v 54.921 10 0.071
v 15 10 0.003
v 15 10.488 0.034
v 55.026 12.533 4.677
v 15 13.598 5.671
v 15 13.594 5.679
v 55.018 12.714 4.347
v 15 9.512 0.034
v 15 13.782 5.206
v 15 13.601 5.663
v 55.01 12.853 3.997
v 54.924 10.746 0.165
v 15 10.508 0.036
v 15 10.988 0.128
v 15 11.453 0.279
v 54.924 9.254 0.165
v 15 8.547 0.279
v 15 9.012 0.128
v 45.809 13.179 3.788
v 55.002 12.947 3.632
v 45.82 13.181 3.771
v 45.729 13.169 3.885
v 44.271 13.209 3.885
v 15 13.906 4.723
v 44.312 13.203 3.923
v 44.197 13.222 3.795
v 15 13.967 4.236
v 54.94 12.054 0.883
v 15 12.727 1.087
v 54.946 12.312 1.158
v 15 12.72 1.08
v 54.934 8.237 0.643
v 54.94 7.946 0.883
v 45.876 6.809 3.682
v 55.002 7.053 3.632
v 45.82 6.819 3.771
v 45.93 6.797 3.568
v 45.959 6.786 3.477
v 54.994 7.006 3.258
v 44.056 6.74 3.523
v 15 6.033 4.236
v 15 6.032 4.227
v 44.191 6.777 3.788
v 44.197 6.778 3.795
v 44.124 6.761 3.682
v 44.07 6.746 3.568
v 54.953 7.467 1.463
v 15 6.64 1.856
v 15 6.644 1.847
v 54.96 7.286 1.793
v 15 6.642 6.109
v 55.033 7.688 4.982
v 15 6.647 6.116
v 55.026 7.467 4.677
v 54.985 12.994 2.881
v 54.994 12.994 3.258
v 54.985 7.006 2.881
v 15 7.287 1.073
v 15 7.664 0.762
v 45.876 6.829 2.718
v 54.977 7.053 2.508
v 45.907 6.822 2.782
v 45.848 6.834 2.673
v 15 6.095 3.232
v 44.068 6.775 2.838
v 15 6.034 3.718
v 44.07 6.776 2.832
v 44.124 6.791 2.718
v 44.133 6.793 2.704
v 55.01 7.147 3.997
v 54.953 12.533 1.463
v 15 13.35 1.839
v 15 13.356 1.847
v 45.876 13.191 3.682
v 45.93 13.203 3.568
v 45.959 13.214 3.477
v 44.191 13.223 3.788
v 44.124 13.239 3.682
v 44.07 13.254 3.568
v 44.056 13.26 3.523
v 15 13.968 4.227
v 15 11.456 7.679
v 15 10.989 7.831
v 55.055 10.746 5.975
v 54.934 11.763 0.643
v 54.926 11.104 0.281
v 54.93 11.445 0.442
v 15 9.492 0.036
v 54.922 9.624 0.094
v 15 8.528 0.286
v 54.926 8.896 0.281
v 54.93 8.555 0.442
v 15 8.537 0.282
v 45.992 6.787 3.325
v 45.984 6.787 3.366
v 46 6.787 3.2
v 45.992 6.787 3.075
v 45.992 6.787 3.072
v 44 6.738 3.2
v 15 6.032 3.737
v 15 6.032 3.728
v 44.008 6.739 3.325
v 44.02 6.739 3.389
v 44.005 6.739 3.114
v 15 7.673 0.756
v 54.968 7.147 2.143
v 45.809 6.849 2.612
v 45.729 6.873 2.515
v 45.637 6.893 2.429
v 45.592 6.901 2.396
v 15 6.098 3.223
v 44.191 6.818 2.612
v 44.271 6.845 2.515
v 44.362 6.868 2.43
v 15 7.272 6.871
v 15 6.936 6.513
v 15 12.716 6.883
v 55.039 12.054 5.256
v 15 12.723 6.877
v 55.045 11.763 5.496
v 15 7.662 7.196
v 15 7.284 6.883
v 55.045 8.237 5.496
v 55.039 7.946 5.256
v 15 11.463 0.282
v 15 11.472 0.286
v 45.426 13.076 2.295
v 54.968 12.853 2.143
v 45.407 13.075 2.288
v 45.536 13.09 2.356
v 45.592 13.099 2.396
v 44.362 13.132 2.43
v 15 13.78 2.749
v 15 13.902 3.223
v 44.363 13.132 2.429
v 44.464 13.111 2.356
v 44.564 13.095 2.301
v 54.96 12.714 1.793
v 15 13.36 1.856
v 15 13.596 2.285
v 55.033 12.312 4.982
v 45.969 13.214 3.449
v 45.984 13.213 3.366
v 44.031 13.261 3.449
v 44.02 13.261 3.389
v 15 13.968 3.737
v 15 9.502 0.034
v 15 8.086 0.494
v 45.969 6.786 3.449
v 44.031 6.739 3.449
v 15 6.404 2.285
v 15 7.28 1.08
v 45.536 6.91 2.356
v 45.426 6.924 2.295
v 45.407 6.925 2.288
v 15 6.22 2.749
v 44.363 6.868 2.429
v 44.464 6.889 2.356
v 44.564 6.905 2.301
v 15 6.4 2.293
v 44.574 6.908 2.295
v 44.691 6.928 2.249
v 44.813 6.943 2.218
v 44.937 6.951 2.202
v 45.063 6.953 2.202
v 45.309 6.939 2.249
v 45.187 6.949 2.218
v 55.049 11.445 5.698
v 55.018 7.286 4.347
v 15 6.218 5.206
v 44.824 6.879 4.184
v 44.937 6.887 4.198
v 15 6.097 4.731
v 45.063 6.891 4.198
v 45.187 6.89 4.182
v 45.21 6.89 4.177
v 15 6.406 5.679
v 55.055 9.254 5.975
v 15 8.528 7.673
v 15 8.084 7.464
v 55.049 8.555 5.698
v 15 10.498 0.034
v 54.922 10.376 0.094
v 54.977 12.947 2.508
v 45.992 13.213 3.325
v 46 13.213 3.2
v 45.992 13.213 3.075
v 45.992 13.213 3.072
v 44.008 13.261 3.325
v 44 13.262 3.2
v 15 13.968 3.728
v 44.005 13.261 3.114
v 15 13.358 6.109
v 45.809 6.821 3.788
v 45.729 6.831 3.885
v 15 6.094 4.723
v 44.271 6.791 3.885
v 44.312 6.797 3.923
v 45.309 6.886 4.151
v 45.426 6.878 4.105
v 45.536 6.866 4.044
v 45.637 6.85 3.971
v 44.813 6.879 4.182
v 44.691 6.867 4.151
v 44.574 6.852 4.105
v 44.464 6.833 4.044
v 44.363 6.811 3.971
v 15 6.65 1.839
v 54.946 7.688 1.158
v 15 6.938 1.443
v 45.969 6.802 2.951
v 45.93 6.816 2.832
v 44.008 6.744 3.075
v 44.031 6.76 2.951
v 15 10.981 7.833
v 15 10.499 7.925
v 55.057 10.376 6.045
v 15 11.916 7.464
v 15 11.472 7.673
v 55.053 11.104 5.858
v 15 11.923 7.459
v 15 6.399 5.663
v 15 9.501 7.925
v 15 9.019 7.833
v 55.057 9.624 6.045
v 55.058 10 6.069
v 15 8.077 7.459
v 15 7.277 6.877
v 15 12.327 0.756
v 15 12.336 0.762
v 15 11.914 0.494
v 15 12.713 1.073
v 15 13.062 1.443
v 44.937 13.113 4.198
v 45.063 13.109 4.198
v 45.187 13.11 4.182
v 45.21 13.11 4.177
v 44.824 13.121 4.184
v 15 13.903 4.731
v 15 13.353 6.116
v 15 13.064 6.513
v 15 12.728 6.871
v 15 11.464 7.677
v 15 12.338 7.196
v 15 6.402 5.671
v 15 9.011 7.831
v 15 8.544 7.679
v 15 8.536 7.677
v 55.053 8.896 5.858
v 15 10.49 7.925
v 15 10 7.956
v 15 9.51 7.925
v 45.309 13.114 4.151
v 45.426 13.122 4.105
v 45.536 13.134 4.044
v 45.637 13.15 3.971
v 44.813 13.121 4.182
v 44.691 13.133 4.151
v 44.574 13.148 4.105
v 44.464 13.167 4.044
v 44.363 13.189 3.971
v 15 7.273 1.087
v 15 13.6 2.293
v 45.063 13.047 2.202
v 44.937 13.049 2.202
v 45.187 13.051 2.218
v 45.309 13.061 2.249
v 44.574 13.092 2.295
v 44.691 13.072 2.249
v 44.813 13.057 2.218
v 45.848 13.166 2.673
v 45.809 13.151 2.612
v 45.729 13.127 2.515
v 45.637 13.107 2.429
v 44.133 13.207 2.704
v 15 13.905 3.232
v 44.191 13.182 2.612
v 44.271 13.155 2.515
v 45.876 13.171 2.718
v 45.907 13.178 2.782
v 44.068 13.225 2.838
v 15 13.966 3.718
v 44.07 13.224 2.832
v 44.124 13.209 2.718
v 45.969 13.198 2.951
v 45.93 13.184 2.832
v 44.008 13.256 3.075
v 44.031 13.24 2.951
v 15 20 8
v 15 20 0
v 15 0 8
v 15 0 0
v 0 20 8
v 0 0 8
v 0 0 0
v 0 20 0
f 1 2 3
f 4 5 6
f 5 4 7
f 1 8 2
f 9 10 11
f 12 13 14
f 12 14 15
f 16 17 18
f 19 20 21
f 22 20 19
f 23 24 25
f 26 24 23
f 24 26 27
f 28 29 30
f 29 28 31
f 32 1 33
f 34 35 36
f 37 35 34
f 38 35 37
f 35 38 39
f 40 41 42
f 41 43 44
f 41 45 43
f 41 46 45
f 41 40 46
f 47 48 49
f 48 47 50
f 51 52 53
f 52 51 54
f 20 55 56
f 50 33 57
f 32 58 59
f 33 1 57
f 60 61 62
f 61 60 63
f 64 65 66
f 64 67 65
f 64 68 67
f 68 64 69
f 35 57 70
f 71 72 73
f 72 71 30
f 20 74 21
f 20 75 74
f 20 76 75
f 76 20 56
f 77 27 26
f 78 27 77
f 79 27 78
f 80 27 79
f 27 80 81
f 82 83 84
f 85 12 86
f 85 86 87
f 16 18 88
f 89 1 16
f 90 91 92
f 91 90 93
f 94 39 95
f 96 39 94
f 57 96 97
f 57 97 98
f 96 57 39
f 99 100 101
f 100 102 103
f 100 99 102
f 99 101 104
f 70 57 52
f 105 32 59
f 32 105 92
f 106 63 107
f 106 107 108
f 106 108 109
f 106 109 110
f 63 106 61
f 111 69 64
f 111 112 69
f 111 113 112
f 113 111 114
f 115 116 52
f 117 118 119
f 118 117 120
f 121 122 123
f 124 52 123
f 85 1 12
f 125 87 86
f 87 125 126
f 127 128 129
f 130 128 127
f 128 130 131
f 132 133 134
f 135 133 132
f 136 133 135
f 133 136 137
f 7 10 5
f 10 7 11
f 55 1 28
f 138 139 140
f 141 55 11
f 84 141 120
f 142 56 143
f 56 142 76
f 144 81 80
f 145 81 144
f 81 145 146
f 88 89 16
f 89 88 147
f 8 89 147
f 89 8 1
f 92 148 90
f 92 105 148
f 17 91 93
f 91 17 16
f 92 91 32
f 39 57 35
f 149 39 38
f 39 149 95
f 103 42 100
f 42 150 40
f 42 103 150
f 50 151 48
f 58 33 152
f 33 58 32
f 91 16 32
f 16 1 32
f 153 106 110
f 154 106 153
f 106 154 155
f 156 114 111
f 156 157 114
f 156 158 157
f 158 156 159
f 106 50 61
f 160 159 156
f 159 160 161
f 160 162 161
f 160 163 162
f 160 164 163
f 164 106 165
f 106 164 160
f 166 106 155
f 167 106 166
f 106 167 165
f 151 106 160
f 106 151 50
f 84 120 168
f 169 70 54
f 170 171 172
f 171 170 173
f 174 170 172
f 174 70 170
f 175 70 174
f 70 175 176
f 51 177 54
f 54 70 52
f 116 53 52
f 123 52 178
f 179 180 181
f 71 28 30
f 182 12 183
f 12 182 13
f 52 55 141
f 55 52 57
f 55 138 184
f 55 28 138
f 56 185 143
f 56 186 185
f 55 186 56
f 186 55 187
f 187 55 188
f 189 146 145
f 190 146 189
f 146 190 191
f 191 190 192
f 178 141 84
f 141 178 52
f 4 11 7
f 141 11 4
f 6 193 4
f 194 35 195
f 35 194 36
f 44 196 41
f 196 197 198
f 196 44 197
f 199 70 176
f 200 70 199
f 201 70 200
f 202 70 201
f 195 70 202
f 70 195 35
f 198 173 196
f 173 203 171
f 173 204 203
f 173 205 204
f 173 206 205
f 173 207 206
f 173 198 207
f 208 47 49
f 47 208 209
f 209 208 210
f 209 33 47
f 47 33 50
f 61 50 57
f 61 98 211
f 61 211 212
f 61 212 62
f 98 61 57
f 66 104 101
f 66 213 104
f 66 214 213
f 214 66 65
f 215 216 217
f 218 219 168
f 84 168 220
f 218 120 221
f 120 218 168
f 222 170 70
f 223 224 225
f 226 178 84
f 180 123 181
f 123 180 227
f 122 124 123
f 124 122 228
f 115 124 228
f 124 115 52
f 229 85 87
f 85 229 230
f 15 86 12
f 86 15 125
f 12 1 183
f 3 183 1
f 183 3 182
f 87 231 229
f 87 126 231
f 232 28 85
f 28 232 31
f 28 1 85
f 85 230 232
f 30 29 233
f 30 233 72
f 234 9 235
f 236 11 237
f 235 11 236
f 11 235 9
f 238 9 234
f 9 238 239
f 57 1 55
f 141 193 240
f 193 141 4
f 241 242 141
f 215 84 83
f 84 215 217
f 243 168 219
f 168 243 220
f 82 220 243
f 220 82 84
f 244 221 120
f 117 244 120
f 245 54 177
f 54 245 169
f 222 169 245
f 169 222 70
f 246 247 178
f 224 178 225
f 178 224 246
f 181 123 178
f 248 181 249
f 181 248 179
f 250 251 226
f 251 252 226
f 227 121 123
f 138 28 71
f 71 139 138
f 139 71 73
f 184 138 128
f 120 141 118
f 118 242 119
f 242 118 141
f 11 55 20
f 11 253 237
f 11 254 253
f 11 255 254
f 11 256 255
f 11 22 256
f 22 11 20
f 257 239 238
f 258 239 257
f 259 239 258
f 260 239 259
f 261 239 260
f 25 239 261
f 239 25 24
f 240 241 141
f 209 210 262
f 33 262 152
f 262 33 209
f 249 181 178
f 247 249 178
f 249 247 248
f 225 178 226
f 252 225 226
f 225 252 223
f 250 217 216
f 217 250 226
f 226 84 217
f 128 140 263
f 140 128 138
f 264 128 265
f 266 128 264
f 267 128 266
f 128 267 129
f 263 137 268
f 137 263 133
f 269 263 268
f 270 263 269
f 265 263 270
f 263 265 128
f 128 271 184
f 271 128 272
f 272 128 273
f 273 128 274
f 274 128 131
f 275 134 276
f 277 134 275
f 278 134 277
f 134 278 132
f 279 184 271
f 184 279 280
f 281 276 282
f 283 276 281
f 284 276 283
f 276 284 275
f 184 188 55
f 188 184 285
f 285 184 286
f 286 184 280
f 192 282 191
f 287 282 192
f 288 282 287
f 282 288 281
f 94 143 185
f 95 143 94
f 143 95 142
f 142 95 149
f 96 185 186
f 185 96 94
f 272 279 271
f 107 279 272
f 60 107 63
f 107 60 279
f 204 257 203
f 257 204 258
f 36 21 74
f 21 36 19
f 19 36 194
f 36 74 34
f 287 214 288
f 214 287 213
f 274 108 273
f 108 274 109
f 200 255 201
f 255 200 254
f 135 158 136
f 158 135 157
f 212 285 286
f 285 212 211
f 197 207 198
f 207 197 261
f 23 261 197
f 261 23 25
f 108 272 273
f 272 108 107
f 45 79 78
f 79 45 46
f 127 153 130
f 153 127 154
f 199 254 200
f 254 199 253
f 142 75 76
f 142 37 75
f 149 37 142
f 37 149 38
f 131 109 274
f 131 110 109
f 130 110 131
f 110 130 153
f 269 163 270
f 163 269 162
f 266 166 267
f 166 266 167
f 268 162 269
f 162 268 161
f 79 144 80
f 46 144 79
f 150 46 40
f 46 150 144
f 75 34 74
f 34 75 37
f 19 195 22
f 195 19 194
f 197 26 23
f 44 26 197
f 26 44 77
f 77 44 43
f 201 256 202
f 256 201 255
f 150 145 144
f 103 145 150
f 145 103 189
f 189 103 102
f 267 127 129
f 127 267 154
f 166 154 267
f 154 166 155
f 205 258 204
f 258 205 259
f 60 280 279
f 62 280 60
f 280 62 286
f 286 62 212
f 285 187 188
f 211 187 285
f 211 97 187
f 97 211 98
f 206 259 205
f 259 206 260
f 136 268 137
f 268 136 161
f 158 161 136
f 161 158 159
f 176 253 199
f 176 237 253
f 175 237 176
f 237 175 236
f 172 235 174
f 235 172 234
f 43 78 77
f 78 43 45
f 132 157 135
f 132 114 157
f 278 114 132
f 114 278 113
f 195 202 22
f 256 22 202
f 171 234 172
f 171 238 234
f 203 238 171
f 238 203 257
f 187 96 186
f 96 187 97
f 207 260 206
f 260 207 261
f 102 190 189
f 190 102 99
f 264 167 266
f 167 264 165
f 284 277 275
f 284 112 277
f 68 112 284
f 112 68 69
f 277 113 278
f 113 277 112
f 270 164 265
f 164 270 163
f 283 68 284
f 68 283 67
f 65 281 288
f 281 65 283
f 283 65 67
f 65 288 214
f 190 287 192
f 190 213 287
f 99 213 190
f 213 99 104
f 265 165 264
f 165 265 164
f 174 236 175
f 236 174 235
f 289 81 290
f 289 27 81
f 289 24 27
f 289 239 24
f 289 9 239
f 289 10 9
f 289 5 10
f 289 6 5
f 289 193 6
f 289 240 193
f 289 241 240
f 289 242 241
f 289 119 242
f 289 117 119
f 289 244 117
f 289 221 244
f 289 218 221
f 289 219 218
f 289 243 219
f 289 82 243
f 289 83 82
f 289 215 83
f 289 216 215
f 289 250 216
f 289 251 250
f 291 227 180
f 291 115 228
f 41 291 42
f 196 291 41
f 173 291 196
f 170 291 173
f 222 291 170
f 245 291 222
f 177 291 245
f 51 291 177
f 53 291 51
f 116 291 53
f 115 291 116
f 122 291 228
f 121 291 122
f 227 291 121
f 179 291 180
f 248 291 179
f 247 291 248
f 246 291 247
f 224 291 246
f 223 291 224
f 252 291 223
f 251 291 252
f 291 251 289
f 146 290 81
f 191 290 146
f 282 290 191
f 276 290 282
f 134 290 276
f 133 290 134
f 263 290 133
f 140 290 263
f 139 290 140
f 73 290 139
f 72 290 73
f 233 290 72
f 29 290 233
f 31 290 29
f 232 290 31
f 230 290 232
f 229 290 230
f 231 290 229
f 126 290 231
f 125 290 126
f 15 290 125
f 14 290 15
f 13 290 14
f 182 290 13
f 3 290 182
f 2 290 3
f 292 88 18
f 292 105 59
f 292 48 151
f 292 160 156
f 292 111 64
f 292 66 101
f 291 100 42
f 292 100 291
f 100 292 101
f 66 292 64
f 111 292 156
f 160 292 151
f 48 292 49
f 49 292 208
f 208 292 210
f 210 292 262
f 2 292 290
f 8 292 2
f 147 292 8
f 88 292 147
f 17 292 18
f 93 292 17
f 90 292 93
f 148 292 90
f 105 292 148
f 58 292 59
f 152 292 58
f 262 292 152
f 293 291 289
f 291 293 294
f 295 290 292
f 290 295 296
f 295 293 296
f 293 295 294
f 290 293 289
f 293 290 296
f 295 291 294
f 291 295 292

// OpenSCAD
$fn=50;

cube([15,20,8]);
difference () {
  translate([14,10,4])  rotate([0,91.3,0]) cylinder(h=41, r1=4, r2=3);
  translate([45,15,3.2]) rotate([90,0,0]) cylinder(h=10, r=1);
}
